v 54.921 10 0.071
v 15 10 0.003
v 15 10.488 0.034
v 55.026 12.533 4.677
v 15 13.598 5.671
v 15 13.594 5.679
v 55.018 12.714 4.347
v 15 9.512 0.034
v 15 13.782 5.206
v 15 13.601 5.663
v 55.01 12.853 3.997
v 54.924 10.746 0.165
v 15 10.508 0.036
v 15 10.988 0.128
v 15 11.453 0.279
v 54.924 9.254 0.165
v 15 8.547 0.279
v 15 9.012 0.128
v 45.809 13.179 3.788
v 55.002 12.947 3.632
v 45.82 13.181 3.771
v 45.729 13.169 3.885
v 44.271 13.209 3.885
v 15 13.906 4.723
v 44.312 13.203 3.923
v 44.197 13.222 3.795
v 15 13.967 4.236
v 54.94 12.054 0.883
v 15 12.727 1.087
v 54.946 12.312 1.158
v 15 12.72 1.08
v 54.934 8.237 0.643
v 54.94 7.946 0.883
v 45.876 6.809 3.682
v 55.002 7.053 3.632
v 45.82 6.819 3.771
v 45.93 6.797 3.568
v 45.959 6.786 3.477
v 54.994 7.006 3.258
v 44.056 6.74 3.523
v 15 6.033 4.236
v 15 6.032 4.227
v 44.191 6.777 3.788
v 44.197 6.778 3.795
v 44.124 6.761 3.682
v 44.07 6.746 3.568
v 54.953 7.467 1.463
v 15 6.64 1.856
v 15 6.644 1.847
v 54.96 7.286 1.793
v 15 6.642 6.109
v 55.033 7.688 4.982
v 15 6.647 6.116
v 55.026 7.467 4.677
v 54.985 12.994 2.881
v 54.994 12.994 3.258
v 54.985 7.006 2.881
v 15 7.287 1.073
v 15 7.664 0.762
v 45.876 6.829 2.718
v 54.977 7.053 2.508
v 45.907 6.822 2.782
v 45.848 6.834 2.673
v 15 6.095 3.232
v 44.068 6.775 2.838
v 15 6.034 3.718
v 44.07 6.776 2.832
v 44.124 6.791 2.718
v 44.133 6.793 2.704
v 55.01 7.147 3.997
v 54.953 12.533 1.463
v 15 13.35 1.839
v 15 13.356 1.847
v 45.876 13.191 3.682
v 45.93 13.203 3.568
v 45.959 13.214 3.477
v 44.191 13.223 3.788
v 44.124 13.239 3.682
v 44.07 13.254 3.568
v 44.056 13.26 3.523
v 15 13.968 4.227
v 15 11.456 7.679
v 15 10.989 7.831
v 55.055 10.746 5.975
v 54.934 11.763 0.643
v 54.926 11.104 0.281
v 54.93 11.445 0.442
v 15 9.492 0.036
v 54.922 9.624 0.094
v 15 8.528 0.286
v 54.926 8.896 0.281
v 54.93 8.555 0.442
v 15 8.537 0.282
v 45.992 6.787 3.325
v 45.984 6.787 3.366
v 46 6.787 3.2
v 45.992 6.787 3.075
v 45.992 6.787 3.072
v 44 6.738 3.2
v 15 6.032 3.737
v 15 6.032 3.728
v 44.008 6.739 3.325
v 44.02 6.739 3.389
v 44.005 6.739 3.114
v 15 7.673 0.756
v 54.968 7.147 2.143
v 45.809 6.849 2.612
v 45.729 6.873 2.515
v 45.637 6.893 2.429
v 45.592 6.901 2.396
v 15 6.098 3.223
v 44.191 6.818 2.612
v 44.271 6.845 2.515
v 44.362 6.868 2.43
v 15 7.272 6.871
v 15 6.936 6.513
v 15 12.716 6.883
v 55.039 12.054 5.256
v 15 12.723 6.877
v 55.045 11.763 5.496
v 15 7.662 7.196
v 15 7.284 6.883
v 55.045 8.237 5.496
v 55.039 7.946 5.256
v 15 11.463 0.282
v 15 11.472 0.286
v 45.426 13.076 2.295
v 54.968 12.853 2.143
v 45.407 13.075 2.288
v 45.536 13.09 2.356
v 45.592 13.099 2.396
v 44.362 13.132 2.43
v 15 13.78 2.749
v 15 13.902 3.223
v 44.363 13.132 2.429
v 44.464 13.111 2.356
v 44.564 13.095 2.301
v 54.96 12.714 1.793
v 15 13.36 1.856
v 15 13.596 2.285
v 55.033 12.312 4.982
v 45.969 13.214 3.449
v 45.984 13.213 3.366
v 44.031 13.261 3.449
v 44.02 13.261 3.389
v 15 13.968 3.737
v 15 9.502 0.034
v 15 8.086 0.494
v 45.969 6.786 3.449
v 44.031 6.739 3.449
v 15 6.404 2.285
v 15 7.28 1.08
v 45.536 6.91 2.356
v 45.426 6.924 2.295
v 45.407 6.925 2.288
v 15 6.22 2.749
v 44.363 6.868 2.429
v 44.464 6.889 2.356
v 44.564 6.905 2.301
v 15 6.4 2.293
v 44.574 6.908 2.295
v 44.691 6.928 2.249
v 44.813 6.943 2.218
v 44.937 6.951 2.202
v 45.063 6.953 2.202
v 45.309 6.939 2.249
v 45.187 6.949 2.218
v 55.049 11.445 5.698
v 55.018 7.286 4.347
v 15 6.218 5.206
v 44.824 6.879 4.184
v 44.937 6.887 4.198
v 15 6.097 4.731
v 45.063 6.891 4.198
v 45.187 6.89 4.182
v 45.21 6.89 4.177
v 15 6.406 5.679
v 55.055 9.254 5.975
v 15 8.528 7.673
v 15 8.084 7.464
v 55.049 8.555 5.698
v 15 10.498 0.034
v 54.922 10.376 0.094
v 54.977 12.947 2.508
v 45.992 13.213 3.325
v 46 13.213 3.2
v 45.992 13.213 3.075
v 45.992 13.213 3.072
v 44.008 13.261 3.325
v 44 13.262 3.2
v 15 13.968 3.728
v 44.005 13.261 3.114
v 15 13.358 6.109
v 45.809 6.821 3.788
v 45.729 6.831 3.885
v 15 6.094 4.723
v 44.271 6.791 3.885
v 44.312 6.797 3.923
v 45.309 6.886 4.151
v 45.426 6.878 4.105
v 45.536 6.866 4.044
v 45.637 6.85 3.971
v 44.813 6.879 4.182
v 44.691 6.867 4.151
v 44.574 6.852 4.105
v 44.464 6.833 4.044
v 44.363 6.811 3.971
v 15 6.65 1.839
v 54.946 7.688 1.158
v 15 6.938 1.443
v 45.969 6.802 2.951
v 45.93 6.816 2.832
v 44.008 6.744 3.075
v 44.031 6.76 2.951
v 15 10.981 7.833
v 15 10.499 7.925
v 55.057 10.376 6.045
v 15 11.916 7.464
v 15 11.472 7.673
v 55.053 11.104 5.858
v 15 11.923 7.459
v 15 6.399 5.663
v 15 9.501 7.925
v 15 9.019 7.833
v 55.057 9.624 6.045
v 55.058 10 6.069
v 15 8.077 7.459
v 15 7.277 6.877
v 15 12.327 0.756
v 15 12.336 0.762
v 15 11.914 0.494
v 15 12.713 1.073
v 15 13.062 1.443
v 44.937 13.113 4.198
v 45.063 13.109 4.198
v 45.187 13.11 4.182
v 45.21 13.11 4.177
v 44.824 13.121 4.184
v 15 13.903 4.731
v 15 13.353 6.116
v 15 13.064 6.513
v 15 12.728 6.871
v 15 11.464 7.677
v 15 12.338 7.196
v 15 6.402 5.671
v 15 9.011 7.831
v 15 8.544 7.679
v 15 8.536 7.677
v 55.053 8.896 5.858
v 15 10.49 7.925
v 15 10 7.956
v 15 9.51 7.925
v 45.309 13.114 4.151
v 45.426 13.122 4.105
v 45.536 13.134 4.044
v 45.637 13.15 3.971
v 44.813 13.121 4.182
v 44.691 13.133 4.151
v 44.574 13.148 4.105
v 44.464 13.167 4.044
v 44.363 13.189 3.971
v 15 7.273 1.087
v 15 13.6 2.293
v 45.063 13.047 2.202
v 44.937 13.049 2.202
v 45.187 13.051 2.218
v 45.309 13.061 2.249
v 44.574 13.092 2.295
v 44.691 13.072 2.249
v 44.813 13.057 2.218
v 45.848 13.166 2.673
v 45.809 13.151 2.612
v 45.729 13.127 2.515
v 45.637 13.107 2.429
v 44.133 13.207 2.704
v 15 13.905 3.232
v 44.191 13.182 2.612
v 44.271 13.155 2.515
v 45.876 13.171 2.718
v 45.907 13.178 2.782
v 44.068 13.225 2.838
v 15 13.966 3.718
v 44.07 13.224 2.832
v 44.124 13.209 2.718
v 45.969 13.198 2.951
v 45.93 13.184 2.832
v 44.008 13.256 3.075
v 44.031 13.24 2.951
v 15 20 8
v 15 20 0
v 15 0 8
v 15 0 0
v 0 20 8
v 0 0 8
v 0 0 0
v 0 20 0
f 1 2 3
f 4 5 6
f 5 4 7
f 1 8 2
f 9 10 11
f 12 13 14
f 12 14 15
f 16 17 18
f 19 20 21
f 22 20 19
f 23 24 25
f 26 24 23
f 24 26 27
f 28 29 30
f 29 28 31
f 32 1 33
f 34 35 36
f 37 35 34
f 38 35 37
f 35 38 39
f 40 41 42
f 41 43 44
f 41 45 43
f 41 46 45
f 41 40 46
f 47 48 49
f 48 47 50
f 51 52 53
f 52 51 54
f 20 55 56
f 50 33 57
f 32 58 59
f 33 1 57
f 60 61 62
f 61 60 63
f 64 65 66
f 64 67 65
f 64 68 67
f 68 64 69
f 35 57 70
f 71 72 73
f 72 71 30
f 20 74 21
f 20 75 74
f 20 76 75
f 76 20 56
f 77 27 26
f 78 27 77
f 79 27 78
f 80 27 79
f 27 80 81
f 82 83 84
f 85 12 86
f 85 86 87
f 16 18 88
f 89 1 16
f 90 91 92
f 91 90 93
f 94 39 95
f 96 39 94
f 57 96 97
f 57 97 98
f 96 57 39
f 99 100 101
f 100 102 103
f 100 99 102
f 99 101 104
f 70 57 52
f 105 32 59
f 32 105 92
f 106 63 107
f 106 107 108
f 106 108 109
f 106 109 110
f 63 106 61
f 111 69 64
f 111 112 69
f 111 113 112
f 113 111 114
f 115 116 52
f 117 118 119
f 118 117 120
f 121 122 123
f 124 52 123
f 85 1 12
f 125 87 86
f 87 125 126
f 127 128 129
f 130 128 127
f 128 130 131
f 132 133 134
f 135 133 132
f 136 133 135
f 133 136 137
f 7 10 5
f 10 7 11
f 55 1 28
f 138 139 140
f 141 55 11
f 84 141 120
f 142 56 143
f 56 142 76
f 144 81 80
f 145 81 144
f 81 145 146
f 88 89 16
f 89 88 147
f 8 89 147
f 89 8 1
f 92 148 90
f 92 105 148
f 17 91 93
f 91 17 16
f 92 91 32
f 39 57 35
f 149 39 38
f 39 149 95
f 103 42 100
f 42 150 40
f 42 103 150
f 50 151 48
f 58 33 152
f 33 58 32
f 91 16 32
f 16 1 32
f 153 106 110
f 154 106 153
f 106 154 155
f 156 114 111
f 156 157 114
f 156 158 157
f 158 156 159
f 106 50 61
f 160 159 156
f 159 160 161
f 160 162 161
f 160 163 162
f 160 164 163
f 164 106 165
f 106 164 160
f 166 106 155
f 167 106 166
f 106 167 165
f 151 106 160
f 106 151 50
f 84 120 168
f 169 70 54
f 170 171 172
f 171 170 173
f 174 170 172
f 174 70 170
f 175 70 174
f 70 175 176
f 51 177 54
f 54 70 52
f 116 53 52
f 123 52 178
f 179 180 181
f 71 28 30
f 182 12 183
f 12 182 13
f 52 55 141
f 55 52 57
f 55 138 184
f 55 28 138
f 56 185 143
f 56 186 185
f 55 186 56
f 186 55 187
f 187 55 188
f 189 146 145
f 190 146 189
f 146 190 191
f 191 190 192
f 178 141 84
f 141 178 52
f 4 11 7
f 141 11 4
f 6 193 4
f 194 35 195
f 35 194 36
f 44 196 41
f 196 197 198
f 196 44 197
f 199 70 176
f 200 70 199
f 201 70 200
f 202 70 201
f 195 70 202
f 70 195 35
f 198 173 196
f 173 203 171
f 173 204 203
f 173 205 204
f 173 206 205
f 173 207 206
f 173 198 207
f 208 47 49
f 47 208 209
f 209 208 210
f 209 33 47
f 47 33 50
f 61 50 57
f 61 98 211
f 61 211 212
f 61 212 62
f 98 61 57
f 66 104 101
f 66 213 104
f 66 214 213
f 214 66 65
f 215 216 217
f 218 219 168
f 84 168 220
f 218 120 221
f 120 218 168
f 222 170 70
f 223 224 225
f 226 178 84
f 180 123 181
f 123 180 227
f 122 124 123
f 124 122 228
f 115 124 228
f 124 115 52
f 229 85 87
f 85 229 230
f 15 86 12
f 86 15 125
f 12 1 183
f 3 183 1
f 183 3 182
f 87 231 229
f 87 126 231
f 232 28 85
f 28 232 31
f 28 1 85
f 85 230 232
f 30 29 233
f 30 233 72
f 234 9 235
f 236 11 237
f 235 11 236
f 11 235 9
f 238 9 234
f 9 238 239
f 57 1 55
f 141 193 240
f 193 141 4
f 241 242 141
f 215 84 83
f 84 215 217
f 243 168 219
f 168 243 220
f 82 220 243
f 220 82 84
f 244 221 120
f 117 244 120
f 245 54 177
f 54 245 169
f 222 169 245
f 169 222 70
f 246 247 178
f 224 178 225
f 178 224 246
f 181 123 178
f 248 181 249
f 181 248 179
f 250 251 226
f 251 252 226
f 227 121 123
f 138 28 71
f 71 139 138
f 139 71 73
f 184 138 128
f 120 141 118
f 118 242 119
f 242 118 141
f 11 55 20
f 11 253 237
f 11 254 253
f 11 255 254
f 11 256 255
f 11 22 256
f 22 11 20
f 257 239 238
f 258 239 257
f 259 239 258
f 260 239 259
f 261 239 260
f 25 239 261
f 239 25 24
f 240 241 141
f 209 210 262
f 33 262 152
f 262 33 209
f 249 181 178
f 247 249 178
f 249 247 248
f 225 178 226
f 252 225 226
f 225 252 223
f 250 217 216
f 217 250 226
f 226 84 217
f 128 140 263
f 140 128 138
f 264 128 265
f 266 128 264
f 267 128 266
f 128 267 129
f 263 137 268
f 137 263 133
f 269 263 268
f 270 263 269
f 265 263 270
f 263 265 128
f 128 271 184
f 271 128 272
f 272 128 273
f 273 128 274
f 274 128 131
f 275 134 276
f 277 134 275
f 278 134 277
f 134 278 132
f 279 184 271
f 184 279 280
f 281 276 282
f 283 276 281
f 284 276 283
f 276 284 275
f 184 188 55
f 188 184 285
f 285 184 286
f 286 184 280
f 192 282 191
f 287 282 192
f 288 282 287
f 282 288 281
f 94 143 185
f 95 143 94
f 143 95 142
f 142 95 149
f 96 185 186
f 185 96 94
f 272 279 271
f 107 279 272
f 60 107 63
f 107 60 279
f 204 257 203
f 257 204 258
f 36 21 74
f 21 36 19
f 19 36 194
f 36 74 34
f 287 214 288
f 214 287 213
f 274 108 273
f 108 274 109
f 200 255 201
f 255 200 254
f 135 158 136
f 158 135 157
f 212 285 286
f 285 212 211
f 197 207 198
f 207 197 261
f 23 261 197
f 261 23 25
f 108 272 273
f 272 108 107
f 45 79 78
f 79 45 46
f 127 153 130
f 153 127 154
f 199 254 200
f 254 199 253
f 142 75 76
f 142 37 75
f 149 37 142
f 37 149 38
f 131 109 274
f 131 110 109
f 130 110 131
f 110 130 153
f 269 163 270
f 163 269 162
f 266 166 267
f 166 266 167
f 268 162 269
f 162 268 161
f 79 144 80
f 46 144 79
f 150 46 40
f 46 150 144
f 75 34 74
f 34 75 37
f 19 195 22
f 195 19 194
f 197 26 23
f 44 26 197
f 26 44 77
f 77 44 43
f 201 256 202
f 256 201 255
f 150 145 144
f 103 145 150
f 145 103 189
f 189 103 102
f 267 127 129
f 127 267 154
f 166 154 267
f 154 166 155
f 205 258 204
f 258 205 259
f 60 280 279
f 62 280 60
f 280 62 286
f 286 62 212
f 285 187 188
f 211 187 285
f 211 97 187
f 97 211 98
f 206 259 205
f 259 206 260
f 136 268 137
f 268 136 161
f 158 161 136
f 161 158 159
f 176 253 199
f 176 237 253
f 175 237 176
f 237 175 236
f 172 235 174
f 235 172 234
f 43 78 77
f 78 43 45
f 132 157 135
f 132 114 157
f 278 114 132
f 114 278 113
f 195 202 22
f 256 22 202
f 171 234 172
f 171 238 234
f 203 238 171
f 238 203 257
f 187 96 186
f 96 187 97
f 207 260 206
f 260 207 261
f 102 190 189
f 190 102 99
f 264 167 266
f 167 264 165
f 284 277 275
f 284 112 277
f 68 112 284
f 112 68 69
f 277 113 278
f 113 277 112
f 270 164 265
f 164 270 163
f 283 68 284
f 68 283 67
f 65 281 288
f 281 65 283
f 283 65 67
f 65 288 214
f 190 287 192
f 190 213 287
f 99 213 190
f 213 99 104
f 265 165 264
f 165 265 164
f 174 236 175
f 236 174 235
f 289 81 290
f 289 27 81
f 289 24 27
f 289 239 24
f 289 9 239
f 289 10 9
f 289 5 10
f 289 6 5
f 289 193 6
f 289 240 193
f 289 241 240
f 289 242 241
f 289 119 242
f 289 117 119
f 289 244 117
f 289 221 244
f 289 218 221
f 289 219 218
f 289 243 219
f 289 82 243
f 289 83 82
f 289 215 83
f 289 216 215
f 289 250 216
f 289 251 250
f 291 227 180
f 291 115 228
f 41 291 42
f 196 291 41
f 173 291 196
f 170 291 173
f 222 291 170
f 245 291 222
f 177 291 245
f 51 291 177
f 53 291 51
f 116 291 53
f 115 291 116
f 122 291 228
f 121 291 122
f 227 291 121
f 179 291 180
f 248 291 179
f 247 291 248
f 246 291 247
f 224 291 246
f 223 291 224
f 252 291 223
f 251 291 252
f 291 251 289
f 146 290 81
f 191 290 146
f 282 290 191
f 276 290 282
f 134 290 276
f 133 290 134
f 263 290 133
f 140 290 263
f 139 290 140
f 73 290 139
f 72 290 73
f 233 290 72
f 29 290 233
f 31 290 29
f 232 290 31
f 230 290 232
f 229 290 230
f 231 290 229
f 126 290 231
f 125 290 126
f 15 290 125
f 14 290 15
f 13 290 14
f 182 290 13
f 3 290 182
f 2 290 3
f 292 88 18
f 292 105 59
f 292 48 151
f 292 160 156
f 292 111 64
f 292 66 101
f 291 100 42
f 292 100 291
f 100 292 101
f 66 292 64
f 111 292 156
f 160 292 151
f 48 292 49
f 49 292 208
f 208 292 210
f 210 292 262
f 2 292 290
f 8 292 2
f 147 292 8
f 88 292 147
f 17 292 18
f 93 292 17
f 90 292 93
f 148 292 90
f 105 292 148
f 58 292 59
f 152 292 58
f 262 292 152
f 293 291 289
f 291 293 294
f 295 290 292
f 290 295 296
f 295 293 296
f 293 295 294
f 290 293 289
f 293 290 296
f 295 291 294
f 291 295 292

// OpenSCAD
$fn=50;

cube([15,20,8]);
difference () {
  translate([14,10,4])  rotate([0,91.3,0]) cylinder(h=41, r1=4, r2=3);
  translate([45,15,3.2]) rotate([90,0,0]) cylinder(h=10, r=1);
}
